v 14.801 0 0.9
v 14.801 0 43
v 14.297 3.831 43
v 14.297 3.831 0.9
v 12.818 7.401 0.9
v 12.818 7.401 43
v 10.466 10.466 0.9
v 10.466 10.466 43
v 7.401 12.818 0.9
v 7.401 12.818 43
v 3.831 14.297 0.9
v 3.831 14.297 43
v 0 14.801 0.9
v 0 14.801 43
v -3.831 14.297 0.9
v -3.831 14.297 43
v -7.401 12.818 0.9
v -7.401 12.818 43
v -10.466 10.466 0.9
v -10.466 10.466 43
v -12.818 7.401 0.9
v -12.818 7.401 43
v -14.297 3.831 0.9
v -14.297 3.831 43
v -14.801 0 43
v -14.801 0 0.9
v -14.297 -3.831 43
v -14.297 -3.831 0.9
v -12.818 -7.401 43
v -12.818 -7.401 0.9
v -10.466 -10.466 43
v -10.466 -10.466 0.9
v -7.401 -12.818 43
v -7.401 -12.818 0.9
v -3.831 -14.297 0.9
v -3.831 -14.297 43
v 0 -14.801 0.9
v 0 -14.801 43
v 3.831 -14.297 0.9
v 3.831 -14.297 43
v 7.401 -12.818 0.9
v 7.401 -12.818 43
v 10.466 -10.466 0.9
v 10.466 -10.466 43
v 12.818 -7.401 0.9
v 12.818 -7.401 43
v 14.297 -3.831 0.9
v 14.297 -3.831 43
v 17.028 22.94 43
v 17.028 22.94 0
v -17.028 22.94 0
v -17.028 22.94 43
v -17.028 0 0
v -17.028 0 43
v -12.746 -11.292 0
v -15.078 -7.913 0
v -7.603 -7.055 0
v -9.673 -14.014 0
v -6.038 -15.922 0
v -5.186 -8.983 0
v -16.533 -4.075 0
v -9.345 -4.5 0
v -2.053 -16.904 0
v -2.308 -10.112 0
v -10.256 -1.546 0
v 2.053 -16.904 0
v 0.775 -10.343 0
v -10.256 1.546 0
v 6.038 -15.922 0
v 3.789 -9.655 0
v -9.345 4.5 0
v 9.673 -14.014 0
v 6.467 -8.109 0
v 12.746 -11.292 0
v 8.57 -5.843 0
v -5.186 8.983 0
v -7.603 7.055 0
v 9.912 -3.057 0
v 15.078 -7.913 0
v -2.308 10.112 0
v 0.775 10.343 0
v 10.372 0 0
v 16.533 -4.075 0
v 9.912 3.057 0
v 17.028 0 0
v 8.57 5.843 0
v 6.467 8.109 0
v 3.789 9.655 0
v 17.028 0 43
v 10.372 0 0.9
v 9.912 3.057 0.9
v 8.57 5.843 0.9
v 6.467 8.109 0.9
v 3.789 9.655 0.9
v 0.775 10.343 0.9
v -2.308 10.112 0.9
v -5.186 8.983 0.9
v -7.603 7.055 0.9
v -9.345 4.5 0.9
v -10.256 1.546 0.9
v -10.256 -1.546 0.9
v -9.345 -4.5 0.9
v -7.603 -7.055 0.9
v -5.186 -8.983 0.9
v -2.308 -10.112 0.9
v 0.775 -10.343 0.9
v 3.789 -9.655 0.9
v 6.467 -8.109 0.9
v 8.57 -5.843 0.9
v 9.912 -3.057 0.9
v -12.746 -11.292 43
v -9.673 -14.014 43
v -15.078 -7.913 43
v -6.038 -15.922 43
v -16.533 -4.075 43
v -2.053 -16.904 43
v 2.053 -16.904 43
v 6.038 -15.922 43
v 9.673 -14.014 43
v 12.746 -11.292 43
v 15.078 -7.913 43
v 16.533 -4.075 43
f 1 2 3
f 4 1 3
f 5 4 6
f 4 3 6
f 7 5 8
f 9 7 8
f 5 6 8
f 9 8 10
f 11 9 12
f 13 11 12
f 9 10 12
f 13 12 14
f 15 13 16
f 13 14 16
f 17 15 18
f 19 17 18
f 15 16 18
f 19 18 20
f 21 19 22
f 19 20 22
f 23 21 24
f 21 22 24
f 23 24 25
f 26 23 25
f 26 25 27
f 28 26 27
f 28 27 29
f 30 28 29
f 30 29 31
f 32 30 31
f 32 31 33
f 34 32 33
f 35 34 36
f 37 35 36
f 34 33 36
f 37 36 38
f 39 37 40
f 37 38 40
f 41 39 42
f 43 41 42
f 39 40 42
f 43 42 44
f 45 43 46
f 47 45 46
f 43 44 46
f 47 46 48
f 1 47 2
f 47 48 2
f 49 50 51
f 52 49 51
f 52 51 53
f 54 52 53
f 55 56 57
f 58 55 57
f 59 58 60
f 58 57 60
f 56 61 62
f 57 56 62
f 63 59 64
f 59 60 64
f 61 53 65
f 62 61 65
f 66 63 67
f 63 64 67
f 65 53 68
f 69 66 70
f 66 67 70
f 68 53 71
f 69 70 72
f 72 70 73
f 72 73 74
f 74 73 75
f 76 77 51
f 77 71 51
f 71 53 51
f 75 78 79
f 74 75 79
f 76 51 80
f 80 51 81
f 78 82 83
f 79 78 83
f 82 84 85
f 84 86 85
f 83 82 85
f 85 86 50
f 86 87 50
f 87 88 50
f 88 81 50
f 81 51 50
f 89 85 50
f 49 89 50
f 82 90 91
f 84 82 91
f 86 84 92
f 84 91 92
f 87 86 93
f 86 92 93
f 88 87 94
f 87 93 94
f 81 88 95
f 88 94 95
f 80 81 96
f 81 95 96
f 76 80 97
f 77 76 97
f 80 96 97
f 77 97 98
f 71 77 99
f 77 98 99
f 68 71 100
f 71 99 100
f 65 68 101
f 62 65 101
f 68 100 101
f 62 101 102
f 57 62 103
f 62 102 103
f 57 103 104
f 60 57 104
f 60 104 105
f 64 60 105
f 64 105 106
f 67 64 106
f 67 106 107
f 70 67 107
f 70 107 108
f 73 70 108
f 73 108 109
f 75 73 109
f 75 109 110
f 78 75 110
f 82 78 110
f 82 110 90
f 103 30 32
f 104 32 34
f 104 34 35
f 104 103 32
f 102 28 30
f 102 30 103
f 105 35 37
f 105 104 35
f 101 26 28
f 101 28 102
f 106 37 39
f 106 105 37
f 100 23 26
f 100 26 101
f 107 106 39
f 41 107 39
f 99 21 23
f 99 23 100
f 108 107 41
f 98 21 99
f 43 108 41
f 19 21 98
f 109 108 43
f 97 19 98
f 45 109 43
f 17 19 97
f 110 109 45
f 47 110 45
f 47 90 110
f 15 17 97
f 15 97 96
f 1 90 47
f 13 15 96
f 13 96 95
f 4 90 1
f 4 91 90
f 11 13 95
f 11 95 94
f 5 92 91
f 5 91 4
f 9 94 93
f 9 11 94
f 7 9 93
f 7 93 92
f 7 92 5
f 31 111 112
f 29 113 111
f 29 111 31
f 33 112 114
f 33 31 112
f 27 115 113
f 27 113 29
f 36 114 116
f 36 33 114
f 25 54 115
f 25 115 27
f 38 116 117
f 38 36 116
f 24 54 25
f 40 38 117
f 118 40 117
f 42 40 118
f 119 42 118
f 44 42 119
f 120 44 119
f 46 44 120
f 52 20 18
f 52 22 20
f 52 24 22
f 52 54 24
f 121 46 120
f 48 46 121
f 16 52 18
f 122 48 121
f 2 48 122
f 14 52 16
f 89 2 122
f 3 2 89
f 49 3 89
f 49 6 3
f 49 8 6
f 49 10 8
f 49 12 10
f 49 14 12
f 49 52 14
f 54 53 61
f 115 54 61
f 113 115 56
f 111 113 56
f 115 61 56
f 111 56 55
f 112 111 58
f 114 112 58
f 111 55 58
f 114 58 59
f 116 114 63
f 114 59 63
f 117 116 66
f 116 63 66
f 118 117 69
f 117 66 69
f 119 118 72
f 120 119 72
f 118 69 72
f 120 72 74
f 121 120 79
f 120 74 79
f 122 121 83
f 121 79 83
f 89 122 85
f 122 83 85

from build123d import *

# Parameters (mm, degrees)
F1_DEPTH = 43
F2_R     = 14.8013323082
F4_DEPTH = 42.1
F3_R     = 10.3723176452
F5_DEPTH = 43.001


with BuildPart() as f1:
    # F0 (on Top) → F1 (new body)
    with BuildSketch(Plane.XY):
        with BuildLine():
            Line((17.0280970633, 0), (17.0280970633, 22.9404084384))
            Line((17.0280970633, 22.9404084384), (-17.0280970633, 22.9404084384))
            Line((-17.0280970633, 22.9404084384), (-17.0280970633, 0))
            ThreePointArc((-17.0280970633, 0), (0, -17.0280970633), (17.0280970633, 0))
        make_face()
    extrude(amount=F1_DEPTH)

    # F2 (on face) → F4 (cut)
    with BuildSketch(Plane.XY.offset(43)):
        Circle(F2_R)
    extrude(amount=-F4_DEPTH, mode=Mode.SUBTRACT)

    # F3 (on face) → F5 (cut, through all)
    with BuildSketch(Plane.XY.offset(43)):
        Circle(F3_R)
    extrude(amount=-F5_DEPTH, mode=Mode.SUBTRACT)


solid = f1.part
